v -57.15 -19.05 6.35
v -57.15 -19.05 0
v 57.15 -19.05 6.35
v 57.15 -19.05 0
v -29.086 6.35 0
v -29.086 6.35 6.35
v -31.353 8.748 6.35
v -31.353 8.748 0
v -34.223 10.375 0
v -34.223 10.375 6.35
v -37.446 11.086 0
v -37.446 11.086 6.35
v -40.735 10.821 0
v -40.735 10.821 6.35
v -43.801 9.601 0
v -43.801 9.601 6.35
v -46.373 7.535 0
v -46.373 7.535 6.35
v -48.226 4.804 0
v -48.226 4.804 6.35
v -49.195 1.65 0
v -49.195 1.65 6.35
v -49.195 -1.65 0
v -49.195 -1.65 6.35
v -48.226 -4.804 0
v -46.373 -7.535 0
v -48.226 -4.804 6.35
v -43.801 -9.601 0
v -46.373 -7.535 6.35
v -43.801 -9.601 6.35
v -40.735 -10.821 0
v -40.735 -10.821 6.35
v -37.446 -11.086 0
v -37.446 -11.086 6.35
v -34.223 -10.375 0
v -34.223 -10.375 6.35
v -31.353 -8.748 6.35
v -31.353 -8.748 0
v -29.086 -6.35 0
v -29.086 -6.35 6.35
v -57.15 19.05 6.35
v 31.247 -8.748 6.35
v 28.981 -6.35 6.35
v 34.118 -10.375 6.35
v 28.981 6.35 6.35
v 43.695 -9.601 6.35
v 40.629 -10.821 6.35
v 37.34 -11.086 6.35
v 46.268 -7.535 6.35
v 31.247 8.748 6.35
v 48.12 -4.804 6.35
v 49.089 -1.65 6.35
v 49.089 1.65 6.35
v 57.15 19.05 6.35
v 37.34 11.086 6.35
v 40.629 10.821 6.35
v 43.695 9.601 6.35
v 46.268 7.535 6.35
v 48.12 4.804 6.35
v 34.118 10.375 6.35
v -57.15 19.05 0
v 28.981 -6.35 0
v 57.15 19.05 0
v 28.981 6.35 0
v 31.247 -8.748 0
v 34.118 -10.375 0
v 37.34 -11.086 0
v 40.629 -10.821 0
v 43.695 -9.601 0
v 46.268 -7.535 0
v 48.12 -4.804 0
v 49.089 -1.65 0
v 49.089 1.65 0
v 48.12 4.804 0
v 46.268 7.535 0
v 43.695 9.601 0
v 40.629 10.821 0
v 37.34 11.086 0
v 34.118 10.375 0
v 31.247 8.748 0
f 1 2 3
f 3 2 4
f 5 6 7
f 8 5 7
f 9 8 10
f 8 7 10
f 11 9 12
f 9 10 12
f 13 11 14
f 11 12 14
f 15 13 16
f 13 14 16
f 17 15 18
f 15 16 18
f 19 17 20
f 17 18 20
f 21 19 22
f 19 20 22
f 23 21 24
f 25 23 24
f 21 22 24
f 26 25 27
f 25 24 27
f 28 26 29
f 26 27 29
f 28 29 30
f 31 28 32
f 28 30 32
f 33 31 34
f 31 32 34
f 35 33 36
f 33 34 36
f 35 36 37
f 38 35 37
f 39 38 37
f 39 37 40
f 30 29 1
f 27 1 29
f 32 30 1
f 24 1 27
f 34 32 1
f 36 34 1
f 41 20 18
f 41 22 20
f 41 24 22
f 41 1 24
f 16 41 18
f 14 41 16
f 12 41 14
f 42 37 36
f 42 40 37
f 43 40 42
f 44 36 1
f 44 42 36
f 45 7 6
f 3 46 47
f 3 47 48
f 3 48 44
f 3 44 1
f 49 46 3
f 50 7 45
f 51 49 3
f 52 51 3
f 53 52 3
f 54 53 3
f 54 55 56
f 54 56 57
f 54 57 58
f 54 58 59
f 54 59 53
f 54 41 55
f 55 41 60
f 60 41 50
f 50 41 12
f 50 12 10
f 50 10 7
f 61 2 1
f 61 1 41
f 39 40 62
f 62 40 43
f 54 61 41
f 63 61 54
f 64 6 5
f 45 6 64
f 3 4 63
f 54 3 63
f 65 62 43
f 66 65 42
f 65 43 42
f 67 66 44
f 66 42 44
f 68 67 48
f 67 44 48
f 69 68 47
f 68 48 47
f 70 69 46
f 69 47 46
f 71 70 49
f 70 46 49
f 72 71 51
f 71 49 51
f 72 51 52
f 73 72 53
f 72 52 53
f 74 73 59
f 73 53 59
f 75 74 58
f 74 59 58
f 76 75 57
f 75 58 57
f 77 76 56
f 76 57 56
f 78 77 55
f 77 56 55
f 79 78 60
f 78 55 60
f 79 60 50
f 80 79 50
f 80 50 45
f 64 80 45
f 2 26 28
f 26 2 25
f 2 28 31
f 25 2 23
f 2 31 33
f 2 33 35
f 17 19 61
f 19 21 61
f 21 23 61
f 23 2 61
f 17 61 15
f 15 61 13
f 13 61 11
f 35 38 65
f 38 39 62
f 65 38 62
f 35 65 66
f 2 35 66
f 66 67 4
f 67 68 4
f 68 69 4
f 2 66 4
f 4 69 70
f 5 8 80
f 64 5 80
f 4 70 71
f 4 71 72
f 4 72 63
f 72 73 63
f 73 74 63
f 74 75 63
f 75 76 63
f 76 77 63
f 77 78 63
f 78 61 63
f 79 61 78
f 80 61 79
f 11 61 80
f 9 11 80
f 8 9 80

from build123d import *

# Parameters (mm, degrees)
SKETCH1_W           = 114.3
SKETCH1_H           = 38.1
BOSS_EXTRUDE1_DEPTH = 6.35
SKETCH2_R           = 11.1125
CUT_EXTRUDE1_DEPTH  = 61.57513929
SKETCH3_W           = 66.543997706
SKETCH3_H           = 12.7
CUT_EXTRUDE2_DEPTH  = 61.57513929


with BuildPart() as part:
    # Sketch1 → Boss-Extrude1 (new body)
    with BuildSketch(Plane.XY):
        Rectangle(SKETCH1_W, SKETCH1_H)
    extrude(amount=BOSS_EXTRUDE1_DEPTH)

    # Sketch2 → Cut-Extrude1 (cut, through all)
    with BuildSketch(Plane.XY.offset(6.35)):
        with Locations((-38.205321874, 0)):
            Circle(SKETCH2_R)
        with Locations((38.1, 0)):
            Circle(SKETCH2_R)
    extrude(amount=-CUT_EXTRUDE1_DEPTH, mode=Mode.SUBTRACT)

    # Sketch3 → Cut-Extrude2 (cut, through all)
    with BuildSketch(Plane.XY.offset(6.35)):
        Rectangle(SKETCH3_W, SKETCH3_H)
    extrude(amount=-CUT_EXTRUDE2_DEPTH, mode=Mode.SUBTRACT)


solid = part.part
